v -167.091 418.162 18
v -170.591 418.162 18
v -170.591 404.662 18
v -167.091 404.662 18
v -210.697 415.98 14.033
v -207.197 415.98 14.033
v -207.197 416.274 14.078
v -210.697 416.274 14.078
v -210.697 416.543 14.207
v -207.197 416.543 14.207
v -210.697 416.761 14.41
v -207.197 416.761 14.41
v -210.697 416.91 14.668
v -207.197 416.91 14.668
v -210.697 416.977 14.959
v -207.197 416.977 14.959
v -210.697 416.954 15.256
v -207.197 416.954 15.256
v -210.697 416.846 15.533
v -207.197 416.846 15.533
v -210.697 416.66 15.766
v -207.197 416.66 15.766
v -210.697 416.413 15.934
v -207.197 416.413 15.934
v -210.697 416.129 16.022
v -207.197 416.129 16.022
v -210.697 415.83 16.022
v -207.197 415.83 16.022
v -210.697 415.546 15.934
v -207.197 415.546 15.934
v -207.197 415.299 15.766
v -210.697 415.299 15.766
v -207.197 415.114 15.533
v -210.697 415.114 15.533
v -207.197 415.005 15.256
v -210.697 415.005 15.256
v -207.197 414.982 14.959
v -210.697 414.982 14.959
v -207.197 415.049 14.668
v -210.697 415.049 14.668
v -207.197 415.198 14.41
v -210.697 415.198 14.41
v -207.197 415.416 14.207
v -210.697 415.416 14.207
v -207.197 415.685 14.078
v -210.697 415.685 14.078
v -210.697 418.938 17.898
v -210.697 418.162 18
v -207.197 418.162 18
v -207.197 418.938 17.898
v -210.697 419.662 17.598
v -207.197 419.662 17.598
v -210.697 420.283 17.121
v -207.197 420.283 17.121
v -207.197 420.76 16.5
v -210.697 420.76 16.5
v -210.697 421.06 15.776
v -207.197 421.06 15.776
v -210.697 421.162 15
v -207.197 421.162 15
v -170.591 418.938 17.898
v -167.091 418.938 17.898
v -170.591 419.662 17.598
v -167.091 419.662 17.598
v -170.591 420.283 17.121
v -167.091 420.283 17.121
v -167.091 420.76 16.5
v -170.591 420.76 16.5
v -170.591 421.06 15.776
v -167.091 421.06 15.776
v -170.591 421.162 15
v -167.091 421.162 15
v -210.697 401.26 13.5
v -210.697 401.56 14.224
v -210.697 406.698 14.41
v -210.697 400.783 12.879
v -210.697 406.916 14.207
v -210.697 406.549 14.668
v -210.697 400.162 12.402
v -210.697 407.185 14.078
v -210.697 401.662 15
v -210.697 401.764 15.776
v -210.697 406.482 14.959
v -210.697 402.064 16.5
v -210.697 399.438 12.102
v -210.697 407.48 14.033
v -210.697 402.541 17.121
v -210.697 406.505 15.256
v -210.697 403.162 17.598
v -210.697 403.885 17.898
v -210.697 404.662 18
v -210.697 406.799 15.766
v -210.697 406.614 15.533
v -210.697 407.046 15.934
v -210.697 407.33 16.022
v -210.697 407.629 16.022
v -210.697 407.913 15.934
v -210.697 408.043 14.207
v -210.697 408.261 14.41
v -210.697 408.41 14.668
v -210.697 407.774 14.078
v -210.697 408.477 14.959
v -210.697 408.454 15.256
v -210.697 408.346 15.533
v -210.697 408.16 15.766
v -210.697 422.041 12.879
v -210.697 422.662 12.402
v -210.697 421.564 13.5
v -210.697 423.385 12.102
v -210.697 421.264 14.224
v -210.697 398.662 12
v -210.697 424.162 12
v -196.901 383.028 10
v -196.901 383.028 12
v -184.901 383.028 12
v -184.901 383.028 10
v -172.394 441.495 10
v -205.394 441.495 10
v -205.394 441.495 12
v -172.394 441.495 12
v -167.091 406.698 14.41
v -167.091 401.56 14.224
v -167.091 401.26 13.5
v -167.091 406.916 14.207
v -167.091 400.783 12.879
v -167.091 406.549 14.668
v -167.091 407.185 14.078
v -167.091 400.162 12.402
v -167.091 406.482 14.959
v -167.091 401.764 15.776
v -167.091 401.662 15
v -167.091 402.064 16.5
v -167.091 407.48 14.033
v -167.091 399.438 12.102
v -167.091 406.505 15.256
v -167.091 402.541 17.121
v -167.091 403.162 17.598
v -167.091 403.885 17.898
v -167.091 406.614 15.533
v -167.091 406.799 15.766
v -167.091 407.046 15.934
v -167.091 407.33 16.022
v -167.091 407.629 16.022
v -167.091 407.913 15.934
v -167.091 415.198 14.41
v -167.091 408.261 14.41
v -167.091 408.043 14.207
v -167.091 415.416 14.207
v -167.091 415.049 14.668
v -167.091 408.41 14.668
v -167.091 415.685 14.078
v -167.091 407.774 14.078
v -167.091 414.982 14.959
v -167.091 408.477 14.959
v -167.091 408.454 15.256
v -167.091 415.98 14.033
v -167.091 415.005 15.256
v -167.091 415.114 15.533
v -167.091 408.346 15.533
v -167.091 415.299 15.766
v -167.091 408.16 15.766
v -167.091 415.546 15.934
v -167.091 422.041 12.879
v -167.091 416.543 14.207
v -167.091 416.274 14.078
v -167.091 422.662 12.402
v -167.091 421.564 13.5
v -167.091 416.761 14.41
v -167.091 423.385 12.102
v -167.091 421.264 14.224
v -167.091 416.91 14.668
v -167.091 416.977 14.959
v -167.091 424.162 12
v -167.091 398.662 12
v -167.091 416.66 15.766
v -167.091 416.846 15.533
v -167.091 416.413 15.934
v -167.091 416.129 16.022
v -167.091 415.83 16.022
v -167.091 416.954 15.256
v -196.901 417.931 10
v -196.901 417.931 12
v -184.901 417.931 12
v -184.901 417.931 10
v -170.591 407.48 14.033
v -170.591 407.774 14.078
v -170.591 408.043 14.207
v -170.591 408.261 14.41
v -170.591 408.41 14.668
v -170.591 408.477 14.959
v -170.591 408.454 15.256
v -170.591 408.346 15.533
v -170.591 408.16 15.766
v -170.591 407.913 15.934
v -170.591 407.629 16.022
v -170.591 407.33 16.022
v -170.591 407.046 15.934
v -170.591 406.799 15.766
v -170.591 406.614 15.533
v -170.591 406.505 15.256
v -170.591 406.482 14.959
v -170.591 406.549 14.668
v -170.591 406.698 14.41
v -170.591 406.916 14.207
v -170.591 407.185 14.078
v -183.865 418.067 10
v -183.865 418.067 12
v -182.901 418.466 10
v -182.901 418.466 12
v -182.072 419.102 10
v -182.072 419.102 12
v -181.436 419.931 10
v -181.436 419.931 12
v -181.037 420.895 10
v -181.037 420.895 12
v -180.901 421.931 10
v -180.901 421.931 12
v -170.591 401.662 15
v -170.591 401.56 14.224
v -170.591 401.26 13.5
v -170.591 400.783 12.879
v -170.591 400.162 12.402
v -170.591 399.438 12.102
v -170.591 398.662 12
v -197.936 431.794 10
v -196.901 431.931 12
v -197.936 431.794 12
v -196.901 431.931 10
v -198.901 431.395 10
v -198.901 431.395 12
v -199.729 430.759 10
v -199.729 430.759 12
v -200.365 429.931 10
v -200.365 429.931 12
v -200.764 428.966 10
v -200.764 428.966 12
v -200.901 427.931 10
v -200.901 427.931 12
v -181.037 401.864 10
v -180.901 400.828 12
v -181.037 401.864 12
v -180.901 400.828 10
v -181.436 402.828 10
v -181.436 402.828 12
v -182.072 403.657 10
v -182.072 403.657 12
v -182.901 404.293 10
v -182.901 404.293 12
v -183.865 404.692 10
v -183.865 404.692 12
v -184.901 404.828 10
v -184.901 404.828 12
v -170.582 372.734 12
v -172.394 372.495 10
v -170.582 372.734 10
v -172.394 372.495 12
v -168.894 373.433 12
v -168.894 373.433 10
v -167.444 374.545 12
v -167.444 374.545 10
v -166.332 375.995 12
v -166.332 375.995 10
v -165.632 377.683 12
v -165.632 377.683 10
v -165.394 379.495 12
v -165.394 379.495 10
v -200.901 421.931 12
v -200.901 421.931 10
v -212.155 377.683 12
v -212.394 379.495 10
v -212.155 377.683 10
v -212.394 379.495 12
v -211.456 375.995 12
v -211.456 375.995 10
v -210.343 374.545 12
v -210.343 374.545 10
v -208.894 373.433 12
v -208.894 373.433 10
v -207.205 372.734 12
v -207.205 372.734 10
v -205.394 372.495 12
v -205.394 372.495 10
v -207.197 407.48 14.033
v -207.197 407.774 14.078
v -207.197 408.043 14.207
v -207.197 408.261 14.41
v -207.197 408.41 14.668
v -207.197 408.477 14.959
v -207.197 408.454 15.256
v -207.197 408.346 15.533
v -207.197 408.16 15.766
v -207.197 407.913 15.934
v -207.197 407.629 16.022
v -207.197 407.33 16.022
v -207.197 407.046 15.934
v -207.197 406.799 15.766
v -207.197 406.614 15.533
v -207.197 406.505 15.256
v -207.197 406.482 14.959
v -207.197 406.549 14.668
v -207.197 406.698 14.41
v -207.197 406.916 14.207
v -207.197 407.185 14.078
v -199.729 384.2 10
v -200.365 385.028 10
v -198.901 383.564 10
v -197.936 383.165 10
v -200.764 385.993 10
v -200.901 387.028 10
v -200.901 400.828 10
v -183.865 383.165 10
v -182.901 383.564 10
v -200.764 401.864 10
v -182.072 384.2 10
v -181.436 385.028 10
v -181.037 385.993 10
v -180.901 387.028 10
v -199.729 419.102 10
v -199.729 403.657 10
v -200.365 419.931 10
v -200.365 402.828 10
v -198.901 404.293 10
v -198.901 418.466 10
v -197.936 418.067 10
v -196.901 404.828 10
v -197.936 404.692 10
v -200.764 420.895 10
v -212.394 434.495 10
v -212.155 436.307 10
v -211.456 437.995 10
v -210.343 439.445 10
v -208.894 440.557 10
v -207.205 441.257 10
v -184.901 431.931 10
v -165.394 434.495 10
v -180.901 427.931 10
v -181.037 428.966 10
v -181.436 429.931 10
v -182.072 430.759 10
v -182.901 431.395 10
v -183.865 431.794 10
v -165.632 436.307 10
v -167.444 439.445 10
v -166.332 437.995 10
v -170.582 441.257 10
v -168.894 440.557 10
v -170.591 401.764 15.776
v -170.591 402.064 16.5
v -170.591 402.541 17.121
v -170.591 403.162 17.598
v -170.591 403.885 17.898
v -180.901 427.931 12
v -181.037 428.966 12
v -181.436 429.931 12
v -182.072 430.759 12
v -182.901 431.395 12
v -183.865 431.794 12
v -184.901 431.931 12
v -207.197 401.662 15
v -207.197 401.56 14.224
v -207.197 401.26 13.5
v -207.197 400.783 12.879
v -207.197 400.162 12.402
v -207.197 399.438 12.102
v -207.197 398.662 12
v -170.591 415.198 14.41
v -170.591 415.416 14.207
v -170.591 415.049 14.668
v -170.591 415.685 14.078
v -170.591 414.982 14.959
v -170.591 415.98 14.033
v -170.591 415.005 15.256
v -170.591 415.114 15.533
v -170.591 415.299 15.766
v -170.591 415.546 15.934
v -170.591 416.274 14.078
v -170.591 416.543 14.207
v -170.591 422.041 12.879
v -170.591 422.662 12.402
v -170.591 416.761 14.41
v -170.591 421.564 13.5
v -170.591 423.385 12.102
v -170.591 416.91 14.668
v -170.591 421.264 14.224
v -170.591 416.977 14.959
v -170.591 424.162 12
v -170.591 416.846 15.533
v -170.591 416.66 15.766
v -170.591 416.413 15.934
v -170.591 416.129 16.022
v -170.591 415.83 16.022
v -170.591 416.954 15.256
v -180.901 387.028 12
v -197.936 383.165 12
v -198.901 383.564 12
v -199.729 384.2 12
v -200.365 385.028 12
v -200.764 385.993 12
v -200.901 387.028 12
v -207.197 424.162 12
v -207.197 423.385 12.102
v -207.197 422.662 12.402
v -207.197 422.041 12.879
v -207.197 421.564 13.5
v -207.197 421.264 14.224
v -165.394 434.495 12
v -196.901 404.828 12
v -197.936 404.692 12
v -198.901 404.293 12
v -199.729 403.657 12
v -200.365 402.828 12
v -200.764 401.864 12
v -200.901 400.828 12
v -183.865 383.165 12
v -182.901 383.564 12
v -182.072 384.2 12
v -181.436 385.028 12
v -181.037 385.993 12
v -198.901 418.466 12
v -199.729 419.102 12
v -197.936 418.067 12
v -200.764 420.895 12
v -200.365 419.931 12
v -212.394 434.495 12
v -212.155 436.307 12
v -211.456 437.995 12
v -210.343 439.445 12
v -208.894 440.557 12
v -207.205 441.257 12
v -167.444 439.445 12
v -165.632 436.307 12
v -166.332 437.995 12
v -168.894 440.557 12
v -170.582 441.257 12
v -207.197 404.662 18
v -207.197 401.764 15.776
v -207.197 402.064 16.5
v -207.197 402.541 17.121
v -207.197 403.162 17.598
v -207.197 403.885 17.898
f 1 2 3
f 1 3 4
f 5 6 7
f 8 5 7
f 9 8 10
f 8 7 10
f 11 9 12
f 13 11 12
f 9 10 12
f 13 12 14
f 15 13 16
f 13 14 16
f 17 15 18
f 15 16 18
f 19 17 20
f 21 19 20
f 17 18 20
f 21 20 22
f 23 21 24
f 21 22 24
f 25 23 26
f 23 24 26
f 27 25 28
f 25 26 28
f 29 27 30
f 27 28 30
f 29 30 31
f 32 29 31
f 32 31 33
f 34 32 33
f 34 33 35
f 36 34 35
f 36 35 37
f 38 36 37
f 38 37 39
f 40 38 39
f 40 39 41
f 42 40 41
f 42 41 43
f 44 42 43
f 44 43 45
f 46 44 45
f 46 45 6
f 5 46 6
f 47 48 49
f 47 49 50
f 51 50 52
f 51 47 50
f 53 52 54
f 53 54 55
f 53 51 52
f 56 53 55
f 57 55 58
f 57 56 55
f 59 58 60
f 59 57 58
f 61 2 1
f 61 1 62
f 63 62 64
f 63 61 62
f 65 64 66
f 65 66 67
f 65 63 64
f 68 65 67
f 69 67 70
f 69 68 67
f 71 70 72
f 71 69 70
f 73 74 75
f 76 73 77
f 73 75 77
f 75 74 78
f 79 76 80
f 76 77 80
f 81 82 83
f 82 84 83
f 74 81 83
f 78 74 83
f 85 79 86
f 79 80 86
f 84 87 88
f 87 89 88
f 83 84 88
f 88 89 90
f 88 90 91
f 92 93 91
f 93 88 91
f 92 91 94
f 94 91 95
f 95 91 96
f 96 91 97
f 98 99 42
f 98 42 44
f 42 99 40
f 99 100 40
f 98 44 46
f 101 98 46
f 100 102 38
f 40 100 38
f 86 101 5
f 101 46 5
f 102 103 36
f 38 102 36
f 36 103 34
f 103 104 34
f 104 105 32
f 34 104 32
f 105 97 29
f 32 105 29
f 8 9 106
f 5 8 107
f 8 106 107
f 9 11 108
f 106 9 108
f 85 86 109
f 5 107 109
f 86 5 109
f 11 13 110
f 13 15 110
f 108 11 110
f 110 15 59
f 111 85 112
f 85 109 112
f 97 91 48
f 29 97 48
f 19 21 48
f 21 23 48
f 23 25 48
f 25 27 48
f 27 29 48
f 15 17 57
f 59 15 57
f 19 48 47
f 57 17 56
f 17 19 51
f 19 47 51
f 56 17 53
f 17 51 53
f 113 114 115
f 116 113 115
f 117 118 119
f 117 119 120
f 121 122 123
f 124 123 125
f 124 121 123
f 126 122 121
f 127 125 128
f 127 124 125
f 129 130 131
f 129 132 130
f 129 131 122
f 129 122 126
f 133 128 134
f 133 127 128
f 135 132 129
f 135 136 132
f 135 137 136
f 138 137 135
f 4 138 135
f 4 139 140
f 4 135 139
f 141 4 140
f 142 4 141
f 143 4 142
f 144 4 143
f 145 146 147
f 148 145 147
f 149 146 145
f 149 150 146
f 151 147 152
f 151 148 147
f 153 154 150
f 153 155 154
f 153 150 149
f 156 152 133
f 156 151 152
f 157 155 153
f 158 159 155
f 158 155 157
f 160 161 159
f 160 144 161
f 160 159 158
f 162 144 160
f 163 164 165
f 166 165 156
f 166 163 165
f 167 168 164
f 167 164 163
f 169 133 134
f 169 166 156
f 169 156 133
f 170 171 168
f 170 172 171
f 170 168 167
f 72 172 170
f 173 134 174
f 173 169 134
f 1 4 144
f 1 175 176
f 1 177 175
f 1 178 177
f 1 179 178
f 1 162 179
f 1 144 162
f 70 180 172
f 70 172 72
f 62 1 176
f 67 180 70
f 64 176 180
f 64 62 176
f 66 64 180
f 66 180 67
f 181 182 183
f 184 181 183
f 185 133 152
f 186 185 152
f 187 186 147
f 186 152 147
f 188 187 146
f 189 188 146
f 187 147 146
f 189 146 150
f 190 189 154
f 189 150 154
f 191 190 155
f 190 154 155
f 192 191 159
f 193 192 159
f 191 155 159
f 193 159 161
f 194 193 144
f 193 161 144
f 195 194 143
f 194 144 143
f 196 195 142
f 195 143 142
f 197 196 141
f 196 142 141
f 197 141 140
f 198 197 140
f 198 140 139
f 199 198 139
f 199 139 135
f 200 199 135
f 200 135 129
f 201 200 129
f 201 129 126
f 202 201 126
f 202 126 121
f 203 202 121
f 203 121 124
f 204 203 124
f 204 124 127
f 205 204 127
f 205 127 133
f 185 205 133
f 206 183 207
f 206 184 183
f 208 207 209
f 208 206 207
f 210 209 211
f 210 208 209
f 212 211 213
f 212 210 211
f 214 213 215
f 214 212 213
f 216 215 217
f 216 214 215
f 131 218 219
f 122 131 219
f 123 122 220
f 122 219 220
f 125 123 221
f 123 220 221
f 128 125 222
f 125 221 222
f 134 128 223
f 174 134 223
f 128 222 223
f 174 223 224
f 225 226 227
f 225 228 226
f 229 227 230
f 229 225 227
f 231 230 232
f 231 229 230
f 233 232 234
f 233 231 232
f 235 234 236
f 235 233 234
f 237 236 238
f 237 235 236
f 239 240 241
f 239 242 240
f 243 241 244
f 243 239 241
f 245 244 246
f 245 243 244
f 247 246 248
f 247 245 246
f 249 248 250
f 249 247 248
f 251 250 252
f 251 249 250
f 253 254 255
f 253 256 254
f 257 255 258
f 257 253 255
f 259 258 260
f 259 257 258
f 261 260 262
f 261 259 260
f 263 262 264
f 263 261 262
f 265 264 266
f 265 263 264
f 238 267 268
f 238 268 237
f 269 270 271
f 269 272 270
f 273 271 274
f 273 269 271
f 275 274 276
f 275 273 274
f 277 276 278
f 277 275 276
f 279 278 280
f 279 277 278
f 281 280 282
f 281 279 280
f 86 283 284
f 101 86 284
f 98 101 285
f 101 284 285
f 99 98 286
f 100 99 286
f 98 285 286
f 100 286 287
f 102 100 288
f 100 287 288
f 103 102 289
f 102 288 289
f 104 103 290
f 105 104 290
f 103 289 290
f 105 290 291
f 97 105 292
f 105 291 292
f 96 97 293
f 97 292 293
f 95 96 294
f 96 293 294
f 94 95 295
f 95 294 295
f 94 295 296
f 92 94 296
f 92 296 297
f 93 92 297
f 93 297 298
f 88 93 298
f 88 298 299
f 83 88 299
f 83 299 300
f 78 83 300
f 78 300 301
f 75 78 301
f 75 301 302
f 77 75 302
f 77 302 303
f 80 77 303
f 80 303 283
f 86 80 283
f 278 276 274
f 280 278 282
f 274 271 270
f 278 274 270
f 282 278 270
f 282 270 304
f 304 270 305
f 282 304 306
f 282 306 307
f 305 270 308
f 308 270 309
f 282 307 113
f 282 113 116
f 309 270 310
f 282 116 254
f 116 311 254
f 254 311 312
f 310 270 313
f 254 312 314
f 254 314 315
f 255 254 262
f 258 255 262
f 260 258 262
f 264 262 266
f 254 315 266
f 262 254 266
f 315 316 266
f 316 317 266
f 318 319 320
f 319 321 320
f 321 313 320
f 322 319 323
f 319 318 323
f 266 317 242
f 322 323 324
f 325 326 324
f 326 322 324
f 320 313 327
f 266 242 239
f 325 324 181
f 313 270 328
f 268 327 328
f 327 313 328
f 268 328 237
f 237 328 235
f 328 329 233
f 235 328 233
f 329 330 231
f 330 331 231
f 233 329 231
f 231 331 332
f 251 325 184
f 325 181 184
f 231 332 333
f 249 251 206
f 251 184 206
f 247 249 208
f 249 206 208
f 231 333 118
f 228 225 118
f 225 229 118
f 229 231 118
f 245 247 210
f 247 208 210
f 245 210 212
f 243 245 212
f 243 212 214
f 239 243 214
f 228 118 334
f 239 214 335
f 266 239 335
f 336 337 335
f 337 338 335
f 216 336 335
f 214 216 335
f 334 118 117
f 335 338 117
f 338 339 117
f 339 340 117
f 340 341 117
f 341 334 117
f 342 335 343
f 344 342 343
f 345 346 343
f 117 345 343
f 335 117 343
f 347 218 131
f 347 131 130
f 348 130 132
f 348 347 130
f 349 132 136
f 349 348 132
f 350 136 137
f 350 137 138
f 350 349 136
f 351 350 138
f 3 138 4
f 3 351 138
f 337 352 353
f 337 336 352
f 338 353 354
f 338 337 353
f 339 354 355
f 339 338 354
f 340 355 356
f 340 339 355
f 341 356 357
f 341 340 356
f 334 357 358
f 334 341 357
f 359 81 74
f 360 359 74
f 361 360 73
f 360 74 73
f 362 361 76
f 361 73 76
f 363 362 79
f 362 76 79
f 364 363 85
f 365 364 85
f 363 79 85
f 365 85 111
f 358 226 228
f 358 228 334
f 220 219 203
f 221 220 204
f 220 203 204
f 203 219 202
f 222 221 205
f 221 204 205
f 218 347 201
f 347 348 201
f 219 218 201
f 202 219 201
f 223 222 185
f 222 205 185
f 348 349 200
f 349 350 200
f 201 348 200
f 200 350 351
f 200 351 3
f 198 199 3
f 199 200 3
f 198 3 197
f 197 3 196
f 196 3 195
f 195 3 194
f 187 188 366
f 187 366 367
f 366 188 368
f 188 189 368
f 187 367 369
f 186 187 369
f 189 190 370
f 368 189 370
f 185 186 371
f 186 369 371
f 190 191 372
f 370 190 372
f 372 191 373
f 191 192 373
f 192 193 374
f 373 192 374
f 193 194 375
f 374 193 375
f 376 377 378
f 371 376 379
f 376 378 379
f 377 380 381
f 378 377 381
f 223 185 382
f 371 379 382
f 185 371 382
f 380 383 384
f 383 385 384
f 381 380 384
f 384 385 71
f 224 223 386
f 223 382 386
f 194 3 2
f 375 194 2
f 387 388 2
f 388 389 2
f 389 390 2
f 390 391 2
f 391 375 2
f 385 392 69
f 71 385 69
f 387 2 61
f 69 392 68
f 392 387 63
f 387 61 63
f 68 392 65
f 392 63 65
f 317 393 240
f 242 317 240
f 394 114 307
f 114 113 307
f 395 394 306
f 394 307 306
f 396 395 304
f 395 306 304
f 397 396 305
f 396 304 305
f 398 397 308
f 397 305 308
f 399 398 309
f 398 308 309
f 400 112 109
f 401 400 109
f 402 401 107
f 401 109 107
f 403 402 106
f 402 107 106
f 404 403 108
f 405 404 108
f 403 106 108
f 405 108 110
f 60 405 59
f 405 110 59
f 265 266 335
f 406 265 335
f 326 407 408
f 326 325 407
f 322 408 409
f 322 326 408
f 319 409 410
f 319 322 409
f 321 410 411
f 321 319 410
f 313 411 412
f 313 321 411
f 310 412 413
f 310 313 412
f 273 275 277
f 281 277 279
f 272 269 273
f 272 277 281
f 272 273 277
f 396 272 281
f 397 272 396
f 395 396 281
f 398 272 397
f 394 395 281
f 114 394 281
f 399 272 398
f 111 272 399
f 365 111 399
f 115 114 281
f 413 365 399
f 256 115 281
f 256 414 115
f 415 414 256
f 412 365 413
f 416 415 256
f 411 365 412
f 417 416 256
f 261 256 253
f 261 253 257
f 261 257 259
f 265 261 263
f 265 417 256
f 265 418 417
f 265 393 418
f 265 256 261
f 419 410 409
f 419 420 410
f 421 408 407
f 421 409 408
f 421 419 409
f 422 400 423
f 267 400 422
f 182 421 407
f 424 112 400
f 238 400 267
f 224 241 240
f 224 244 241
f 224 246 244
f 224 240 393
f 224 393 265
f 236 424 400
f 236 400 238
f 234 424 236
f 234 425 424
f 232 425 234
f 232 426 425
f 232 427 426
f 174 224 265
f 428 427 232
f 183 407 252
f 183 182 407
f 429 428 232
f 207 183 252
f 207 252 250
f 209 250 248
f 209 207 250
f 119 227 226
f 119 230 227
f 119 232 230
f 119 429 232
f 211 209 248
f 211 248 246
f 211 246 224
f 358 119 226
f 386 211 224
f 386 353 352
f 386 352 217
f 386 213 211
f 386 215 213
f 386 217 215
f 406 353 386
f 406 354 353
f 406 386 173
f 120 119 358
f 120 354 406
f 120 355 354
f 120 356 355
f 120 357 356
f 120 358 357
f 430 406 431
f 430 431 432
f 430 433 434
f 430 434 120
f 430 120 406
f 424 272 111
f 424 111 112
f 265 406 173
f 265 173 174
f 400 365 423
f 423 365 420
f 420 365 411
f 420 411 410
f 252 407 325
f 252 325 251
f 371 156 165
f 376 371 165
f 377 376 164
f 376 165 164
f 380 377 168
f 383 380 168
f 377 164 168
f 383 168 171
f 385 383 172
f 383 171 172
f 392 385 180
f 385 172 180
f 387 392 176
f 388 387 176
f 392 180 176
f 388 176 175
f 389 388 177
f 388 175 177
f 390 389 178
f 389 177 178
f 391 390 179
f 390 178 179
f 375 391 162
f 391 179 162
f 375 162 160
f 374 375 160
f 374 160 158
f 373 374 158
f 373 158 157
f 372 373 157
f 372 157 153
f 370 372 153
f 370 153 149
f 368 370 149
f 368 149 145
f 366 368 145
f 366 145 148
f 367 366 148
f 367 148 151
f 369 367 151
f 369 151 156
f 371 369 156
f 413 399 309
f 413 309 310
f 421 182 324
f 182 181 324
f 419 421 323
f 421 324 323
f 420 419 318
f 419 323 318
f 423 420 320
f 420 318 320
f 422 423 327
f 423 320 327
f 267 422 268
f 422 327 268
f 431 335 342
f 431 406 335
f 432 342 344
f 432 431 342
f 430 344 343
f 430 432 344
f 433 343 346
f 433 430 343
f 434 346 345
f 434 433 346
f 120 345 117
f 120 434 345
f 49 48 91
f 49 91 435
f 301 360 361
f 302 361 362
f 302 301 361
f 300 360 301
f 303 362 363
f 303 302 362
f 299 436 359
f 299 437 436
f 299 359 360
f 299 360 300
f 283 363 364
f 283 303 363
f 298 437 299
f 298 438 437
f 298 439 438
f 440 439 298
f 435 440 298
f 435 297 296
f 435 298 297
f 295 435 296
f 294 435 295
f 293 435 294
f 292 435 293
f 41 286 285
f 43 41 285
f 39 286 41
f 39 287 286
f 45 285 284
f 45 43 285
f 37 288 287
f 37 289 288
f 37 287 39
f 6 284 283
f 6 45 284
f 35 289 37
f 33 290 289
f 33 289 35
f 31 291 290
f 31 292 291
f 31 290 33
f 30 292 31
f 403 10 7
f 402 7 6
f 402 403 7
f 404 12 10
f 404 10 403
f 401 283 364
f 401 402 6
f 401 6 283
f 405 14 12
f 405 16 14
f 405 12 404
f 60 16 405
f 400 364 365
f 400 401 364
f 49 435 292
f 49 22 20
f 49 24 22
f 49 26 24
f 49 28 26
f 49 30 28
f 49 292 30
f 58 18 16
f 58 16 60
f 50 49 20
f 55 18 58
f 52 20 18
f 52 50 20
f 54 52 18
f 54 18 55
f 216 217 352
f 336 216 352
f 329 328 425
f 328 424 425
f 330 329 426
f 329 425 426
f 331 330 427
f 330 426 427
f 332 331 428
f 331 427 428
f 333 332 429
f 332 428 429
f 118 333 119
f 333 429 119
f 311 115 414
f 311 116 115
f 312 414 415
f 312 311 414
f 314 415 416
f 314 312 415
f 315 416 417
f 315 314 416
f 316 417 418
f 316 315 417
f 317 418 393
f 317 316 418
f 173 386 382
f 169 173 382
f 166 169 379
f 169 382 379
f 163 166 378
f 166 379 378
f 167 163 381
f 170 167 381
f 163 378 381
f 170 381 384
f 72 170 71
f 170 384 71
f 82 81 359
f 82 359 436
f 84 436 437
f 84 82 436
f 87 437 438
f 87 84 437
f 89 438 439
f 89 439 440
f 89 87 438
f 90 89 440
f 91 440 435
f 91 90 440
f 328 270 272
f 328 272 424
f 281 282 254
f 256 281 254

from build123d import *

# Parameters (mm, degrees)
SKETCH1_W           = 47
SKETCH1_H           = 69
BOSS_EXTRUDE1_DEPTH = 2
FILLET1_R           = 7
SKETCH2_W           = 20
SKETCH2_H           = 14
SKETCH2_H_2         = 21.8
CUT_EXTRUDE1_DEPTH  = 2
FILLET2_R           = 4
SKETCH4_W           = 3.5
SKETCH4_H           = 19.5
BOSS_EXTRUDE2_DEPTH = 6
FILLET3_START       = -210.696929932
FILLET3_DEPTH       = 43.606418674
FILLET3_2_DEPTH     = 3.5
FILLET3_START_2     = -170.590511258
FILLET3_3_DEPTH     = 3.5
SKETCH5_R           = 1
CUT_EXTRUDE2_DEPTH  = 445.178336025


with BuildPart() as part:
    # Sketch1 → Boss-Extrude1 (new body)
    with BuildSketch(Plane.XY.offset(10)):
        with Locations((-188.893720595, 406.995202033)):
            Rectangle(SKETCH1_W, SKETCH1_H)
    extrude(amount=BOSS_EXTRUDE1_DEPTH)

    # Fillet1
    fillet1_edges = [part.edges().sort_by_distance(p)[0] for p in [
        (-212.393720595, 441.495202033, 11),
        (-165.393720595, 441.495202033, 11),
        (-165.393720595, 372.495202033, 11),
        (-212.393720595, 372.495202033, 11),
    ]]
    fillet(fillet1_edges, radius=FILLET1_R)

    # Sketch2 → Cut-Extrude1 (cut)
    with BuildSketch(Plane.XY.offset(12)):
        with Locations((-190.900590621, 424.93058769)):
            Rectangle(SKETCH2_W, SKETCH2_H)
        with Locations((-190.900590621, 393.92847215)):
            Rectangle(SKETCH2_W, SKETCH2_H_2)
    extrude(amount=-CUT_EXTRUDE1_DEPTH, mode=Mode.SUBTRACT)

    # Fillet2
    fillet2_edges = [part.edges().sort_by_distance(p)[0] for p in [
        (-200.900590621, 417.93058769, 11),
        (-200.900590621, 431.93058769, 11),
        (-180.900590621, 431.93058769, 11),
        (-180.900590621, 417.93058769, 11),
        (-200.900590621, 383.02847215, 11),
        (-200.900590621, 404.82847215, 11),
        (-180.900590621, 404.82847215, 11),
        (-180.900590621, 383.02847215, 11),
    ]]
    fillet(fillet2_edges, radius=FILLET2_R)

    # Sketch4 → Boss-Extrude2 (add)
    with BuildSketch(Plane.XY.offset(12)):
        with Locations((-168.840511258, 411.411865234)):
            Rectangle(SKETCH4_W, SKETCH4_H)
        with Locations((-208.946929932, 411.411865234)):
            Rectangle(SKETCH4_W, SKETCH4_H)
    extrude(amount=BOSS_EXTRUDE2_DEPTH)

    # Fillet3: read off the stored shape, not the designer's step
    # Fillet3 outline → Fillet3 (cut)
    with BuildSketch(Plane.YZ.offset(FILLET3_START)):
        with BuildLine():
            ThreePointArc((418.161865234, 18), (420.283185578, 17.121320344), (421.161865234, 15))
            Line((421.161865234, 15), (421.161865234, 18))
            Line((421.161865234, 18), (418.161865234, 18))
        make_face()
        with BuildLine():
            ThreePointArc((401.661865234, 15), (402.540544891, 17.121320343), (404.661865234, 18))
            Line((404.661865234, 18), (401.661865234, 18))
            Line((401.661865234, 18), (401.661865234, 15))
        make_face()
    extrude(amount=FILLET3_DEPTH, mode=Mode.SUBTRACT)

    # Fillet3 2 outline → Fillet3 2 (add)
    with BuildSketch(Plane.YZ.offset(FILLET3_START)):
        with BuildLine():
            Line((421.161865234, 12), (424.161865234, 12))
            ThreePointArc((424.161865234, 12), (422.040544891, 12.878679657), (421.161865234, 15))
            Line((421.161865234, 15), (421.161865234, 12))
        make_face()
        with BuildLine():
            Line((398.661865234, 12), (401.661865234, 12))
            Line((401.661865234, 12), (401.661865234, 15))
            ThreePointArc((401.661865234, 15), (400.783185578, 12.878679656), (398.661865234, 12))
        make_face()
    extrude(amount=FILLET3_2_DEPTH)

    # Fillet3 3 outline → Fillet3 3 (add)
    with BuildSketch(Plane.YZ.offset(FILLET3_START_2)):
        with BuildLine():
            Line((421.161865234, 12), (424.161865234, 12))
            ThreePointArc((424.161865234, 12), (422.040544891, 12.878679657), (421.161865234, 15))
            Line((421.161865234, 15), (421.161865234, 12))
        make_face()
        with BuildLine():
            Line((398.661865234, 12), (401.661865234, 12))
            Line((401.661865234, 12), (401.661865234, 15))
            ThreePointArc((401.661865234, 15), (400.783185578, 12.878679656), (398.661865234, 12))
        make_face()
    extrude(amount=FILLET3_3_DEPTH)

    # Sketch5 → Cut-Extrude2 (cut, through all)
    with BuildSketch(Plane(origin=(-167.090511258, 0, 0), x_dir=(0, 0, -1), z_dir=(1, 0, 0))):
        with Locations((-15.033399781, 407.479533559)):
            Circle(SKETCH5_R)
        with Locations((-15.033399781, 415.979533559)):
            Circle(SKETCH5_R)
    extrude(amount=-CUT_EXTRUDE2_DEPTH, mode=Mode.SUBTRACT)


solid = part.part
